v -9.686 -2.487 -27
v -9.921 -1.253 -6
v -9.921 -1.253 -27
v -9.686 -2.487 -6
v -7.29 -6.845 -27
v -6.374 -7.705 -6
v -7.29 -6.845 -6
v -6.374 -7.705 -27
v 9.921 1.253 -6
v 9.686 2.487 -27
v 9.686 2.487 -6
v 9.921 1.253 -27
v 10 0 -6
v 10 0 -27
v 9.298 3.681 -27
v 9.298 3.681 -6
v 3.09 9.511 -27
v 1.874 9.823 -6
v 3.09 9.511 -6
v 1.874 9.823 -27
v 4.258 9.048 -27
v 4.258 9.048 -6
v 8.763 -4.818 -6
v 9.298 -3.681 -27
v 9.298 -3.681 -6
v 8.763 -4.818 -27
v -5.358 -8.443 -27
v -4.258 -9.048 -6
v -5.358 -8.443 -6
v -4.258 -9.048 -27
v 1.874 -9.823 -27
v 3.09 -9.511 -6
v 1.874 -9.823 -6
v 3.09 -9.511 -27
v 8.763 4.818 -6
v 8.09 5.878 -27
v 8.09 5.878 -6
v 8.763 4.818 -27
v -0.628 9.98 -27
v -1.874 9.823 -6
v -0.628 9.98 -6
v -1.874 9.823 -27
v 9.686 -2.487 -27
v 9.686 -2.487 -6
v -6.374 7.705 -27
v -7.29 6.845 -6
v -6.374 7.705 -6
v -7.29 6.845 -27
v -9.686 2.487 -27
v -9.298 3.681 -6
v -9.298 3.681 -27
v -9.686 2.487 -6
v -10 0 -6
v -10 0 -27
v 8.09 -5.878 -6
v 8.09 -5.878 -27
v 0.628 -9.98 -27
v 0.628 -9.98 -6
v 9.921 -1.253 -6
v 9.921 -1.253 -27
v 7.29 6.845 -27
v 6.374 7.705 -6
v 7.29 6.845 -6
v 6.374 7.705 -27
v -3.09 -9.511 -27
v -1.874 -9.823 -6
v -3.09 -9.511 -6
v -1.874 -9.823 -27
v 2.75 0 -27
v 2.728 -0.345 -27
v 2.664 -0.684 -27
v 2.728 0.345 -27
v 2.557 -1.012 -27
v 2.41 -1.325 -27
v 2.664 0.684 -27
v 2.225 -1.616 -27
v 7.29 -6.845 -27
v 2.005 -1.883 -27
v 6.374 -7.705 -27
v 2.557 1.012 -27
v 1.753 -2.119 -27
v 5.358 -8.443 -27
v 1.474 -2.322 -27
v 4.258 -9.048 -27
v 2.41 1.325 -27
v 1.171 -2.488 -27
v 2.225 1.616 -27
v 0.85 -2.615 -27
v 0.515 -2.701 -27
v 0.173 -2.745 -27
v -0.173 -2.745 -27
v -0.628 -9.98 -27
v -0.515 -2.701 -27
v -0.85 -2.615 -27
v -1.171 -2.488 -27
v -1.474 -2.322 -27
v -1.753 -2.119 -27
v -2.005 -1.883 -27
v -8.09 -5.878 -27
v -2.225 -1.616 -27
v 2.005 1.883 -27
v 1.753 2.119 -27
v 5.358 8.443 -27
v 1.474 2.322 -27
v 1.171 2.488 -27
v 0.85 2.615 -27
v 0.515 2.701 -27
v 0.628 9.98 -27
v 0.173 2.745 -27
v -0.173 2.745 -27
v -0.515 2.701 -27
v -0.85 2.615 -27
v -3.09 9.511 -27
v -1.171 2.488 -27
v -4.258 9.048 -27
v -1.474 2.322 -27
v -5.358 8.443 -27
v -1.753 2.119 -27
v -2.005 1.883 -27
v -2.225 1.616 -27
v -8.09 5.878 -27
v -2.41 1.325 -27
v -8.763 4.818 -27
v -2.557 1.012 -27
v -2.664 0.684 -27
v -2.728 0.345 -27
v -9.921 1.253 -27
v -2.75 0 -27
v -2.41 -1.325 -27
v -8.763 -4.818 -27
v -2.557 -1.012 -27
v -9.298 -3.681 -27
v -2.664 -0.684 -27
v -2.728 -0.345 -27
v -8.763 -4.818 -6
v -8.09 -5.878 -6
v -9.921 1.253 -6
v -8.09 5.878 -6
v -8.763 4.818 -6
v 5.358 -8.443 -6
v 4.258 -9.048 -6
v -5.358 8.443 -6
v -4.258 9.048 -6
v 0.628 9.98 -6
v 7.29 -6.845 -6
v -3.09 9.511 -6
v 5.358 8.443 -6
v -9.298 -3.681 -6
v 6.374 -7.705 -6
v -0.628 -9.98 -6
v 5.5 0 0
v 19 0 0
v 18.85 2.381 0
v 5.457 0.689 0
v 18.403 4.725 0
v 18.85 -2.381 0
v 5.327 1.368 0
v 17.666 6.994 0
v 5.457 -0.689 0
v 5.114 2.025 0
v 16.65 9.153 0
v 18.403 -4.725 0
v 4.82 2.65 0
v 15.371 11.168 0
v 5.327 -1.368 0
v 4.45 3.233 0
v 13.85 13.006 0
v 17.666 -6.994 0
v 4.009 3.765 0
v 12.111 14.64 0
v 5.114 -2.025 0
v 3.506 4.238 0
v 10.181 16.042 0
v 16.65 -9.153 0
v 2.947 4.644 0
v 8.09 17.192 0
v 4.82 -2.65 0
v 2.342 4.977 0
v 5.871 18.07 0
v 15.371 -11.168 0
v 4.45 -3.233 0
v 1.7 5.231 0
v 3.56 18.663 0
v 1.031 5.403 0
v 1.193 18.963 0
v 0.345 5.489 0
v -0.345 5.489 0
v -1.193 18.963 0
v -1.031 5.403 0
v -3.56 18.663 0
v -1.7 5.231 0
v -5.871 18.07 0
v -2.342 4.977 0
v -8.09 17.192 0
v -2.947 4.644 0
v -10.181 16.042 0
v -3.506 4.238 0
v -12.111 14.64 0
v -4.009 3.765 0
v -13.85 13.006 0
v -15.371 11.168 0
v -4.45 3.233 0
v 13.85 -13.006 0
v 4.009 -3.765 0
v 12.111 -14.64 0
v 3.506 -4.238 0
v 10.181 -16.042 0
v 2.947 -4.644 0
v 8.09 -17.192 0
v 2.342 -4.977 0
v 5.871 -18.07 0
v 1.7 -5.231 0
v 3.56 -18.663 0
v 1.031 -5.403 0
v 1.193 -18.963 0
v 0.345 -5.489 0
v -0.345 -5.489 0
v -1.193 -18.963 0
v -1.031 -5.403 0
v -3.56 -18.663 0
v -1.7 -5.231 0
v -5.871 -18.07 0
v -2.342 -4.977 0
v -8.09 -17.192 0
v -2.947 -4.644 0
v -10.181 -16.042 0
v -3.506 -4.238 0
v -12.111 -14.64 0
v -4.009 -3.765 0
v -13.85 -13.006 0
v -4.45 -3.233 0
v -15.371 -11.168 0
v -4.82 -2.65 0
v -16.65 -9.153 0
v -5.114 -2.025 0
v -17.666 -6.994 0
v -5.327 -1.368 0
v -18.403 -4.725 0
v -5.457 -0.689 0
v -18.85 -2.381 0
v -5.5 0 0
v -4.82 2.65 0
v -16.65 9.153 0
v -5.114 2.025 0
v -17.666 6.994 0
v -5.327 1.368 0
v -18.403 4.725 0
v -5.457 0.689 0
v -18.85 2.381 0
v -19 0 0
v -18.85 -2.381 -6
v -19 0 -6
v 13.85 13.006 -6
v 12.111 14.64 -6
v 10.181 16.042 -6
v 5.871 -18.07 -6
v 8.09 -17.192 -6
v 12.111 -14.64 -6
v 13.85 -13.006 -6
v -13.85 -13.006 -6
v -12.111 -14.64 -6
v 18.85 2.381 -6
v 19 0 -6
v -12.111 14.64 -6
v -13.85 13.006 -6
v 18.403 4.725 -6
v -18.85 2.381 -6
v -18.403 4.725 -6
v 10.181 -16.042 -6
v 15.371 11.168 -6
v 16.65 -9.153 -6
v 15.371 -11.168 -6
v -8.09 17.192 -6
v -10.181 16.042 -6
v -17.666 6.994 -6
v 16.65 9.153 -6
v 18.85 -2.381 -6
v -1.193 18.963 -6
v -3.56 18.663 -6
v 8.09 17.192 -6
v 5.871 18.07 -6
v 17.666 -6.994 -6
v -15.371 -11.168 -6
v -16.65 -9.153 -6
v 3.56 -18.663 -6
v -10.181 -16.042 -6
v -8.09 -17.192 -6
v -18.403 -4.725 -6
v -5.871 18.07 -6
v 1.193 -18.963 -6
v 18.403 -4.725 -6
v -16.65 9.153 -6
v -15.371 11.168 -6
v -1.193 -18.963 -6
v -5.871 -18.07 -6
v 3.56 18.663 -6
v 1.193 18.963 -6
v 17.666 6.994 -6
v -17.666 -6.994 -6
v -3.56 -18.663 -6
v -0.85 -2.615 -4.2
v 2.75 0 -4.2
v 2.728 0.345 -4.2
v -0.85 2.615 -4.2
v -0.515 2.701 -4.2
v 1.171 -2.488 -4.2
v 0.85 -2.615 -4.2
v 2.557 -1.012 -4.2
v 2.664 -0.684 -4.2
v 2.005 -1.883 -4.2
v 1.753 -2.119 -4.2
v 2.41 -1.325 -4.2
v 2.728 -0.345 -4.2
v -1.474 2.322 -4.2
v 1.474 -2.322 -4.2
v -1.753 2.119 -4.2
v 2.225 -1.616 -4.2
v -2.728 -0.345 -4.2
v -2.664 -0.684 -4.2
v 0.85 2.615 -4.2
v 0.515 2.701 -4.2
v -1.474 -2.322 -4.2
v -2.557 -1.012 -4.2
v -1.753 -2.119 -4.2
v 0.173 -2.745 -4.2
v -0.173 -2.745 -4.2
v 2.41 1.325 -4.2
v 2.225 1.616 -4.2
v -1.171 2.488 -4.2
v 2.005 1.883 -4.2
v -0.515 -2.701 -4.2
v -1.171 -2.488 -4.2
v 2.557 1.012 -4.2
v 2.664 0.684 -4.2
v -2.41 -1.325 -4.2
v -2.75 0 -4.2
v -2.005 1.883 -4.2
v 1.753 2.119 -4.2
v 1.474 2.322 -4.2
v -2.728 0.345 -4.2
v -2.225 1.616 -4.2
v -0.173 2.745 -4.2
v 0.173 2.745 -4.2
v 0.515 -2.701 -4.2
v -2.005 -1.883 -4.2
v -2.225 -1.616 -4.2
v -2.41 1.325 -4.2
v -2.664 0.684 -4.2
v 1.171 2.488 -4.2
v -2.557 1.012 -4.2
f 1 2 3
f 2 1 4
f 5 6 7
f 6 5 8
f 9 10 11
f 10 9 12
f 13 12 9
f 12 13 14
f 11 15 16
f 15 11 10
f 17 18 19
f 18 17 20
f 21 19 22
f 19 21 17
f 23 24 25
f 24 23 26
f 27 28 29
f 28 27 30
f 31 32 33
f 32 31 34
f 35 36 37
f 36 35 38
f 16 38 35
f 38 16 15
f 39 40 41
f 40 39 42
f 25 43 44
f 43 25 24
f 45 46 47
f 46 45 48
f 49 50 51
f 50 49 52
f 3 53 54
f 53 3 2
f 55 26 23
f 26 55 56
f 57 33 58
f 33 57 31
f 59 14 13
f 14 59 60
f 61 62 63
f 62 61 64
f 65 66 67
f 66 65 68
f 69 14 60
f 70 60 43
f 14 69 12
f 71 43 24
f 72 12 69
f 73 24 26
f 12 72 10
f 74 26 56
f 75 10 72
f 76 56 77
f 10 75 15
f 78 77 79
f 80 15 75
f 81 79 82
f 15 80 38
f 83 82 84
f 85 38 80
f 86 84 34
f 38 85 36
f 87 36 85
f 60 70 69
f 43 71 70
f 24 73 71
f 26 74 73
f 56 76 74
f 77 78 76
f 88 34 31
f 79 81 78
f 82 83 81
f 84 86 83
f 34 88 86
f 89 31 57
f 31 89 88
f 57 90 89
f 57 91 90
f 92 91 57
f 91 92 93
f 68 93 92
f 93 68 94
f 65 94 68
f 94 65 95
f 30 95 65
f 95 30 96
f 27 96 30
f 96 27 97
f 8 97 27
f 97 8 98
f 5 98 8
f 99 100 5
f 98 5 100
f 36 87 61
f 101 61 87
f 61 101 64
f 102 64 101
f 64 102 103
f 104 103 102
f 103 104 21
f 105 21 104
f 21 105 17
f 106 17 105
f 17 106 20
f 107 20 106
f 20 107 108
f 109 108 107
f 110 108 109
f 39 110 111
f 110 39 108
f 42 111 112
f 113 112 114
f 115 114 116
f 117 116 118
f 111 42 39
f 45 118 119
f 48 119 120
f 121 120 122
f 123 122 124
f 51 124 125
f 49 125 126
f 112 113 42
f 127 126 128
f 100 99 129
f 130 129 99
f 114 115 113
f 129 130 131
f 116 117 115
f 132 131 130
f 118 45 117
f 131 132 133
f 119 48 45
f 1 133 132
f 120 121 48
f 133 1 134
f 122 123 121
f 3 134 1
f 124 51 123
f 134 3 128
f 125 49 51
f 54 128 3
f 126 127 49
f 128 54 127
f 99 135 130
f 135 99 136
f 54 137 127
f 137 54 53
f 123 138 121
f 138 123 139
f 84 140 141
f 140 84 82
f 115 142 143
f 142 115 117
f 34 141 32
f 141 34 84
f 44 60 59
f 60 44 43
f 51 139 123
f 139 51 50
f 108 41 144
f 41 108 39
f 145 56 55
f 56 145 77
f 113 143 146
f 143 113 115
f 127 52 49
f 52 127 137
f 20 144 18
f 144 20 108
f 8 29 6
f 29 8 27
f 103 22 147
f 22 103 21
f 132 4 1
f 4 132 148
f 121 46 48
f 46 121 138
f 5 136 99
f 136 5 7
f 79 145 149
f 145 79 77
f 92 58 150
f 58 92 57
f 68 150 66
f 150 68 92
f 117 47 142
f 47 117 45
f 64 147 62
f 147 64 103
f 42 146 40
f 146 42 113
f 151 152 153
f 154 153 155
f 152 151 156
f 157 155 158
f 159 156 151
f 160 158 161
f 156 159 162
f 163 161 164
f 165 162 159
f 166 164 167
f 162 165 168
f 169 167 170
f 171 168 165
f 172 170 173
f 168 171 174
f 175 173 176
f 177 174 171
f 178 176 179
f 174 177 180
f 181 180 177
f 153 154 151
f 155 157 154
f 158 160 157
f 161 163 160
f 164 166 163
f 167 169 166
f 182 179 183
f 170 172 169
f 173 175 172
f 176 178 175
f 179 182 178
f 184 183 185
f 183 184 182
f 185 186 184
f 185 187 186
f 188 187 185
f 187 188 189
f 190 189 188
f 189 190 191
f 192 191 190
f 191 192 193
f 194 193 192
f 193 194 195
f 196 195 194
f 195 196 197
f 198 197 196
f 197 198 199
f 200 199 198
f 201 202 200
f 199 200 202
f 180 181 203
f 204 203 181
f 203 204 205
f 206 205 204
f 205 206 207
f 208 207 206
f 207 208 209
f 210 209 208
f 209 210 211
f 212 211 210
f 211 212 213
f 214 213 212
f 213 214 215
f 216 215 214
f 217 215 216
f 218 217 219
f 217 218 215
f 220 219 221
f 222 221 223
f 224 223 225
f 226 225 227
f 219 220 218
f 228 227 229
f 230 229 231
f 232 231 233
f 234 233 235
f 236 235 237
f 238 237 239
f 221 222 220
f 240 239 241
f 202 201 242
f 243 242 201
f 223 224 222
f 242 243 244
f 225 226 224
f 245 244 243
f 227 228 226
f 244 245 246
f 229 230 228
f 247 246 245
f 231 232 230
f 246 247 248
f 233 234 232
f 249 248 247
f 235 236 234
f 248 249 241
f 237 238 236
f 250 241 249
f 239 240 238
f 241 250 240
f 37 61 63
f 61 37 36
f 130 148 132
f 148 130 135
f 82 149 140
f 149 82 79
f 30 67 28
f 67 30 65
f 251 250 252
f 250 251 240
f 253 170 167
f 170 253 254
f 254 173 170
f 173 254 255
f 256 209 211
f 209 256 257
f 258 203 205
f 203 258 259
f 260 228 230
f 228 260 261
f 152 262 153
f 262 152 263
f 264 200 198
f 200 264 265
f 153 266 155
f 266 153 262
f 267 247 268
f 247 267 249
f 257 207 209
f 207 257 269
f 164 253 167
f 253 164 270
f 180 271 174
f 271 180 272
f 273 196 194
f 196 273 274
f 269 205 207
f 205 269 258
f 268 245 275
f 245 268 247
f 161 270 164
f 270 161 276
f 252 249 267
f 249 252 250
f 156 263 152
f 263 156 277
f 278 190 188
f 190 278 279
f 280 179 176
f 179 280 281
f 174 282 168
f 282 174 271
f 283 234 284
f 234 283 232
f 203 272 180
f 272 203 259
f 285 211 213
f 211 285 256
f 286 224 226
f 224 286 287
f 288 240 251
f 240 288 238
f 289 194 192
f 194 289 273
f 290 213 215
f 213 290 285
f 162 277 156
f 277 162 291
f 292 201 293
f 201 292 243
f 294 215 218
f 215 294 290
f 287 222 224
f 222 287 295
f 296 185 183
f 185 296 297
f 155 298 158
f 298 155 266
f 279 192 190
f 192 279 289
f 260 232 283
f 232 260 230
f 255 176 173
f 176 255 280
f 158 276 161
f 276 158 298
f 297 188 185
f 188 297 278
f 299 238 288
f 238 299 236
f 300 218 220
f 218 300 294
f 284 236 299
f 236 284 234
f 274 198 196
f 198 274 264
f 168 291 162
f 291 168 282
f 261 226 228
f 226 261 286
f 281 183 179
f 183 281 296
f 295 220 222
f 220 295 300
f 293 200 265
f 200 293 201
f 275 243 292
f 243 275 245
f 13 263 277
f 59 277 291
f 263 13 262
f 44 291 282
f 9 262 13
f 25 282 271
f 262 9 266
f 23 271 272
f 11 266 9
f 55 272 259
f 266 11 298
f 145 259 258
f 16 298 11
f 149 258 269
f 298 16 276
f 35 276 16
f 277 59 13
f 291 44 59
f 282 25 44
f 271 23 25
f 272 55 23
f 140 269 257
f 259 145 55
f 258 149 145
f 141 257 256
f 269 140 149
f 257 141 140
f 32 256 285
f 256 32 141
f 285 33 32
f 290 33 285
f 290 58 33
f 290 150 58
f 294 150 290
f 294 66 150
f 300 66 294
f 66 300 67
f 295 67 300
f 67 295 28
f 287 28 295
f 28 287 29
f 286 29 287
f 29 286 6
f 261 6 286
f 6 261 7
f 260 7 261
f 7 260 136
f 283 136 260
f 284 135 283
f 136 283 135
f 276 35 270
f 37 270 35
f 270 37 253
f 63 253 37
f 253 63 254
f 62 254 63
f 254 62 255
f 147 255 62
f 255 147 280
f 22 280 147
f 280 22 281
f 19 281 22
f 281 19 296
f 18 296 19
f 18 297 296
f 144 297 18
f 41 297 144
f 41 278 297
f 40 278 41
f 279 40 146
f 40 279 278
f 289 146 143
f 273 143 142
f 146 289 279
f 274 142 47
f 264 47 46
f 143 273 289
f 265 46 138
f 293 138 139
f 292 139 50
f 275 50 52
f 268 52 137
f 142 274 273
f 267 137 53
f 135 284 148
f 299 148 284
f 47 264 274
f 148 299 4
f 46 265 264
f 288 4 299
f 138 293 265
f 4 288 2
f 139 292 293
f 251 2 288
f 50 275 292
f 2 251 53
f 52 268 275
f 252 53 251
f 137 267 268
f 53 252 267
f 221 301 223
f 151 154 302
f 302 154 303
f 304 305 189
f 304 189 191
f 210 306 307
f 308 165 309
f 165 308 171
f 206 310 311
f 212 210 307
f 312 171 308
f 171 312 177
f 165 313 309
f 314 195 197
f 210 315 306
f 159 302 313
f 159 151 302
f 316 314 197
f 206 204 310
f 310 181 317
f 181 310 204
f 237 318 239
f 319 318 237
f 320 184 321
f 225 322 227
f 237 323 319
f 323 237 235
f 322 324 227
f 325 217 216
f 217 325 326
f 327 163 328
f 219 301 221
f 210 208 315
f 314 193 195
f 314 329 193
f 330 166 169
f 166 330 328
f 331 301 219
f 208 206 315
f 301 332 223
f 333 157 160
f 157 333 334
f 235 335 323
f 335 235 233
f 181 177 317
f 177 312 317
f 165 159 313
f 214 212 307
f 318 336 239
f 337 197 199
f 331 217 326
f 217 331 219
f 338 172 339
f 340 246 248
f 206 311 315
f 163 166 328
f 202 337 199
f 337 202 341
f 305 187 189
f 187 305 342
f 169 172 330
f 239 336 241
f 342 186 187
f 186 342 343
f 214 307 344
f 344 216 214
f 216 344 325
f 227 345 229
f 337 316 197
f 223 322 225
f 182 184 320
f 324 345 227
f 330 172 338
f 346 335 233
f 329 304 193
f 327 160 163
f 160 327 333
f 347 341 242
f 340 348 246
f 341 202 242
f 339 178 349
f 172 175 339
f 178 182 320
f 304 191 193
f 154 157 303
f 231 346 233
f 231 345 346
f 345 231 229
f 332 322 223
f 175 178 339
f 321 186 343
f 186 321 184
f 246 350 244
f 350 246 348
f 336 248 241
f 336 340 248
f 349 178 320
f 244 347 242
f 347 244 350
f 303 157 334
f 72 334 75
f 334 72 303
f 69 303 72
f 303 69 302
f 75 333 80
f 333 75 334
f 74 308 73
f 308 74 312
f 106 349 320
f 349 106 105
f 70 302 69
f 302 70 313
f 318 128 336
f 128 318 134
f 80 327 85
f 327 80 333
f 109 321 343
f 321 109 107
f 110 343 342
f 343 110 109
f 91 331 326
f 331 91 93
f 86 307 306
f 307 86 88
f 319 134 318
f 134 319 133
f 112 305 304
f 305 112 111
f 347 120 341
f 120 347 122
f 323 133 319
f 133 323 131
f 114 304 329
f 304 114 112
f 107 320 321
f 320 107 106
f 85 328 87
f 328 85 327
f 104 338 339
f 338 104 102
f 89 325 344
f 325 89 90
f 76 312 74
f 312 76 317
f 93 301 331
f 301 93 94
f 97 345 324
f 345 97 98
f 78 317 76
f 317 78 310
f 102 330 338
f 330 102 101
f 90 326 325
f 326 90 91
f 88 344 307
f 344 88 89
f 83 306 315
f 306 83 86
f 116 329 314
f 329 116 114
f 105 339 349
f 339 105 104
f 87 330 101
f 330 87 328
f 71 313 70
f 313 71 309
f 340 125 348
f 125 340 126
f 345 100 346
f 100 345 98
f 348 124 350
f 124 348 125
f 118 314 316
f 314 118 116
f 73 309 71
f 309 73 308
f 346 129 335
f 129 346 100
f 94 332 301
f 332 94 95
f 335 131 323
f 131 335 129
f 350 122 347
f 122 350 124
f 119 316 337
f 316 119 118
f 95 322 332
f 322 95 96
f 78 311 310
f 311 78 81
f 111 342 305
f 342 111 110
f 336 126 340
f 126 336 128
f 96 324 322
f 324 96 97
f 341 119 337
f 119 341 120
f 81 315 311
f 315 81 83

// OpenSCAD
$fn = 50;


difference() {
	union() {
		translate(v = [0, 0, -27.0000000000]) {
			cylinder(h = 27, r = 10.0000000000);
		}
		translate(v = [0, 0, -6.0000000000]) {
			cylinder(h = 6, r = 19.0000000000);
		}
	}
	union() {
		translate(v = [0, 0, 0]) {
			rotate(a = [0, 0, 0]) {
				difference() {
					union() {
						#translate(v = [0, 0, -27.0000000000]) {
							cylinder(h = 27, r = 2.2500000000);
						}
						#translate(v = [0, 0, -4.2000000000]) {
							cylinder(h = 4.2000000000, r = 10.0000000000, r1 = 2.7500000000, r2 = 5.5000000000);
						}
						#translate(v = [0, 0, -27.0000000000]) {
							cylinder(h = 27, r = 2.7500000000);
						}
						#translate(v = [0, 0, -27.0000000000]) {
							cylinder(h = 27, r = 2.2500000000);
						}
					}
					union();
				}
			}
		}
	}
}
